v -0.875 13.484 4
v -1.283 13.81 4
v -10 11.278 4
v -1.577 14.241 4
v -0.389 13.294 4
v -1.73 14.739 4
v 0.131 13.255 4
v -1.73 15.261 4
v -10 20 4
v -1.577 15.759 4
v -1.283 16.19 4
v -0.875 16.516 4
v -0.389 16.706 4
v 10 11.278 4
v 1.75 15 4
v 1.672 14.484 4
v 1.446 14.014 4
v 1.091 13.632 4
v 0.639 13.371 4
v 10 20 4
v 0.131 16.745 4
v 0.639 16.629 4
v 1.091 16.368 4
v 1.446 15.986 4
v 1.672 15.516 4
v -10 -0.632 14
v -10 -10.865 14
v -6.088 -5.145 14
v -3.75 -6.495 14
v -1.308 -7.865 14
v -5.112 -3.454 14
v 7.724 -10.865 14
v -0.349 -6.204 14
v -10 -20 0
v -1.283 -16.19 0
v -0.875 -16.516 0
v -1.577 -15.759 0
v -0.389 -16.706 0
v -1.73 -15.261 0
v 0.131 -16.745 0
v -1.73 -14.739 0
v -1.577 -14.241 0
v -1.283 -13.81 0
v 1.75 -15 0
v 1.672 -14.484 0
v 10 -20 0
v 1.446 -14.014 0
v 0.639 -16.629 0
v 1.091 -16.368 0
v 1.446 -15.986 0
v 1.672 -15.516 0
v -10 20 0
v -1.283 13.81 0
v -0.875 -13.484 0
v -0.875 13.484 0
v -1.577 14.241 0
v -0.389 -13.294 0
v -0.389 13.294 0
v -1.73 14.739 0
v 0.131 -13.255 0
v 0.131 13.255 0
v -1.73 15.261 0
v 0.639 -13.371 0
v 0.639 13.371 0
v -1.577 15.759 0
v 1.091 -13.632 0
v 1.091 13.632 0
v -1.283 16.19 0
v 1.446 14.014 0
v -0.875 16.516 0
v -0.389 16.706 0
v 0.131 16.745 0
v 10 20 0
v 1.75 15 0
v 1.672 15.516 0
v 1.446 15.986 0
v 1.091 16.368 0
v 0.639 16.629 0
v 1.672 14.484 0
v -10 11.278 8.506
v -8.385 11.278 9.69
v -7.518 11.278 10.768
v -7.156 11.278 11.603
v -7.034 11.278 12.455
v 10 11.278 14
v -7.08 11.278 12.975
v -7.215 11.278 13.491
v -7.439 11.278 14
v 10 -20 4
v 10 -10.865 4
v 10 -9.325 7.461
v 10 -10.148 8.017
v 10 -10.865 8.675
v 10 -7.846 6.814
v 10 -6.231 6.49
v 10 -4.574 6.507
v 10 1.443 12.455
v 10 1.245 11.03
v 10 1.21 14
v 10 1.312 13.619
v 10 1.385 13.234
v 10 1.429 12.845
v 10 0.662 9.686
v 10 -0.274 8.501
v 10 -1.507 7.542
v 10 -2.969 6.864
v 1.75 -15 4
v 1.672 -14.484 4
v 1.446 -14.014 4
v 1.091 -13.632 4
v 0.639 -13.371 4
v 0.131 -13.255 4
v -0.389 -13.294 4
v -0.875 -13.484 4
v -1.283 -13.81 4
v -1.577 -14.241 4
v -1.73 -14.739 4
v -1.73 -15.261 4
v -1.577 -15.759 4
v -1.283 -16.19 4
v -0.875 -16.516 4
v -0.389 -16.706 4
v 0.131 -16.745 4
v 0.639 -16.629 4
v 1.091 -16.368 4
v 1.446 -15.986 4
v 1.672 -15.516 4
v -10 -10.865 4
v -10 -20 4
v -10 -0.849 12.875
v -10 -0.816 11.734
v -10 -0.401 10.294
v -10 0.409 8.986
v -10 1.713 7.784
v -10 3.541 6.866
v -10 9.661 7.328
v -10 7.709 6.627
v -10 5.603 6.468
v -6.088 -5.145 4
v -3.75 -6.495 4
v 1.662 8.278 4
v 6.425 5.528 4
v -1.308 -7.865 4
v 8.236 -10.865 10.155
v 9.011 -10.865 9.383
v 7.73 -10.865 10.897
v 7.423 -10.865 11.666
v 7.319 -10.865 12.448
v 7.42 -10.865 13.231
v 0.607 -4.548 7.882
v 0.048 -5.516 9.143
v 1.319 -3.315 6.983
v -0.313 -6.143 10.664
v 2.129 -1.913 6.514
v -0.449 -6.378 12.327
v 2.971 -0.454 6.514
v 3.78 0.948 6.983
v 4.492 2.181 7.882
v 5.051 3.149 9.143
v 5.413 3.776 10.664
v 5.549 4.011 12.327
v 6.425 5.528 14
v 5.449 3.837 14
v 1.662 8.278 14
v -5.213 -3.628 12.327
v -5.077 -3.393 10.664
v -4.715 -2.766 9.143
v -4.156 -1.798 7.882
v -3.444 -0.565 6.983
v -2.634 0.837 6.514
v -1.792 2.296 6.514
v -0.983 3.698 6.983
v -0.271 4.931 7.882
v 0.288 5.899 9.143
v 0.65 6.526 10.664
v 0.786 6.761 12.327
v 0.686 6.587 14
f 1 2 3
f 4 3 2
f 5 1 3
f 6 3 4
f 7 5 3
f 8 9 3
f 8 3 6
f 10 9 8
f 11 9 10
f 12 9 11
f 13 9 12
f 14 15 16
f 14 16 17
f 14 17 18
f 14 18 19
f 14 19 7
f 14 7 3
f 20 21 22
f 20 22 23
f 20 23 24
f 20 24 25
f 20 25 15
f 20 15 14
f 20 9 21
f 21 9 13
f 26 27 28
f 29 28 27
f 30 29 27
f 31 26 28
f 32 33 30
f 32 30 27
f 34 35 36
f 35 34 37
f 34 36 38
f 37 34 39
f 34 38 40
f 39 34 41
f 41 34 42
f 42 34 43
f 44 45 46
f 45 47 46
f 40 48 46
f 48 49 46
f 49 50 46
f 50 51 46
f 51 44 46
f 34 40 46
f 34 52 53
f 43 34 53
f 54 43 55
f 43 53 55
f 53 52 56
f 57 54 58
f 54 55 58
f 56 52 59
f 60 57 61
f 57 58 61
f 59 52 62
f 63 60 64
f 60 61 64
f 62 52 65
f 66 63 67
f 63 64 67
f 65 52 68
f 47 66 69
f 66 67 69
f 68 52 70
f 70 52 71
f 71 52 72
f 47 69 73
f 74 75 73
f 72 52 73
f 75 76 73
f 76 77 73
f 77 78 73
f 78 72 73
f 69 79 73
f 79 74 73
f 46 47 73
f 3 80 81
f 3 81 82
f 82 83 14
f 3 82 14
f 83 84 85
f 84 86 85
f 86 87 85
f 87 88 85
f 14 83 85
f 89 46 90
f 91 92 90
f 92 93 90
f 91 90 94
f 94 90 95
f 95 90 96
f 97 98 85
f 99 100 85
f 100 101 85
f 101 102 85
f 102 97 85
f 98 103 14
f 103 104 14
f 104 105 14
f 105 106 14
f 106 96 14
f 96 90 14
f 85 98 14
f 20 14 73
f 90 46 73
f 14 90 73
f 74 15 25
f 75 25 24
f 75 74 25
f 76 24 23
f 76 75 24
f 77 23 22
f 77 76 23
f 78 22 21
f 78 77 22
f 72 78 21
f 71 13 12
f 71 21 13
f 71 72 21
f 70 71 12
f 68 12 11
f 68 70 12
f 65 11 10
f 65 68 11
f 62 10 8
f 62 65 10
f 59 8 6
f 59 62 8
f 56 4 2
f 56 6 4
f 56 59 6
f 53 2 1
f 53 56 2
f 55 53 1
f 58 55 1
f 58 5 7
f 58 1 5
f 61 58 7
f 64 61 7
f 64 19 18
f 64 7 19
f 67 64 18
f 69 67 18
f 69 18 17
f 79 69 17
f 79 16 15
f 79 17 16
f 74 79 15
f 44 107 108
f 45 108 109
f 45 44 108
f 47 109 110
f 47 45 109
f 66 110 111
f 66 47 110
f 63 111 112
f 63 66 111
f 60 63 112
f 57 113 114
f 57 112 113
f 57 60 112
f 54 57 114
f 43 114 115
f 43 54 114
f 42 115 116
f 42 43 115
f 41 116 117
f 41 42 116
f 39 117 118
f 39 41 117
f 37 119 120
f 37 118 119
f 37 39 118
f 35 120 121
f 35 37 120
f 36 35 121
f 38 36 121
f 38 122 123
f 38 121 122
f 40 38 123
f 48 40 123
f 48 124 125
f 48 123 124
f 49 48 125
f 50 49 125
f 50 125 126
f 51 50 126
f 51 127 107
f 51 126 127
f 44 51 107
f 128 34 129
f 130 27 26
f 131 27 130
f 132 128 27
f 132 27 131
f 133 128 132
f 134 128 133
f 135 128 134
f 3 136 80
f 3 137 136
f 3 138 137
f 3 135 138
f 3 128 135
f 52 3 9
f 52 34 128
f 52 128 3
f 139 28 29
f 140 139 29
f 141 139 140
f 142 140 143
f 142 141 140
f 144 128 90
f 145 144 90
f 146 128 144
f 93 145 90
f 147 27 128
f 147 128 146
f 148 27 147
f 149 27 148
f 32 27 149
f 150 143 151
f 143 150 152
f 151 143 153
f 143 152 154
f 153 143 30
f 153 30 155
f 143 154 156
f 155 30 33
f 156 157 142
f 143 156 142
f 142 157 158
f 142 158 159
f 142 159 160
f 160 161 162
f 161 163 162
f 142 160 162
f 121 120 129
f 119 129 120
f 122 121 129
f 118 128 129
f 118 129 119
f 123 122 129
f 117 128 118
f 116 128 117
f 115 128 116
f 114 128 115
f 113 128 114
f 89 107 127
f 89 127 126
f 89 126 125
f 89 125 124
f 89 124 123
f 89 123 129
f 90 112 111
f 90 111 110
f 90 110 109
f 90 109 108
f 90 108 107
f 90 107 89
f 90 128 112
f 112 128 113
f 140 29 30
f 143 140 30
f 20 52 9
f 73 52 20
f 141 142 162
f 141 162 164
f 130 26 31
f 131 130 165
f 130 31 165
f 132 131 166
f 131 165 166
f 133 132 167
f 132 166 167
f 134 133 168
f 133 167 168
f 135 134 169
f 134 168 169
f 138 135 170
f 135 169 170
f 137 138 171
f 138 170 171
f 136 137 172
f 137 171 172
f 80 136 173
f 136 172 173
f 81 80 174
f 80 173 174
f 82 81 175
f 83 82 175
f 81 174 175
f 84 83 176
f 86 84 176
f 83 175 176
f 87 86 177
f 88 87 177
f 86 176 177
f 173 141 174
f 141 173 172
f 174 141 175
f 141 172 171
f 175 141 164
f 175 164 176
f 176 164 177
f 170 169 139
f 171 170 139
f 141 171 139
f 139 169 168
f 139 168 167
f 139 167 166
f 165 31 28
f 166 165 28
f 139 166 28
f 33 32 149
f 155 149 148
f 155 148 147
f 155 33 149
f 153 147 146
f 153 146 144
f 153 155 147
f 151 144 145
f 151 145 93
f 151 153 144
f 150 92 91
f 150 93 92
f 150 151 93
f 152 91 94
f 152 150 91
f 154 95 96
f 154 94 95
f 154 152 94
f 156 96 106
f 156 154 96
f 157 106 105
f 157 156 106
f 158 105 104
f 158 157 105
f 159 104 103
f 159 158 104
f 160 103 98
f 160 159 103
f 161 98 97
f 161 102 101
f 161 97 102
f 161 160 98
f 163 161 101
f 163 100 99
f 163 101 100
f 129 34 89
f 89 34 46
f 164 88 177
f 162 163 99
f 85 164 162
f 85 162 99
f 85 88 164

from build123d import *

# Parameters (mm, degrees)
F0_W          = 20
F0_H          = 40
F0_R          = 1.75
F1_DEPTH      = 14
F2_W          = 20
F2_H          = 8.7217967697
F2_H_2        = 9.1349255253
F3_DEPTH      = 10
F4_R          = 6
F5_DEPTH      = 14
F5_DEPTH_BACK = 20


with BuildPart() as f1:
    # F0 (on Top) → F1 (new body)
    with BuildSketch(Plane.XY):
        Rectangle(F0_W, F0_H)
        with Locations((0, -15)):
            Circle(F0_R, mode=Mode.SUBTRACT)
        with Locations((0, 15)):
            Circle(F0_R, mode=Mode.SUBTRACT)
    extrude(amount=F1_DEPTH)

    # F2 (on face) → F3 (cut)
    with BuildSketch(Plane.XY.offset(14)):
        Polygon((-6.0882685902, -5.1451905284), (-3.75, -6.4951905284), (-1.3077413577, -7.8650744747), (6.4248711306, 5.5282032303), (1.6617314098, 8.2782032303), align=None)
        with Locations((0, 15.6391016151)):
            Rectangle(F2_W, F2_H)
        with Locations((0, -15.4325372373)):
            Rectangle(F2_W, F2_H_2)
    extrude(amount=-F3_DEPTH, mode=Mode.SUBTRACT)

    # F4 (on face) → F5 (cut, two sides)
    with BuildSketch(Plane(origin=(-2.3382685902, 1.35, 0), x_dir=(0.5, 0.8660254038, 0), z_dir=(0.8660254038, -0.5, 0))) as f5_sk:
        with Locations((0.25, 12.454691343)):
            Circle(F4_R)
    extrude(amount=-F5_DEPTH, mode=Mode.SUBTRACT)
    extrude(f5_sk.sketch, amount=F5_DEPTH_BACK, mode=Mode.SUBTRACT)


solid = f1.part
